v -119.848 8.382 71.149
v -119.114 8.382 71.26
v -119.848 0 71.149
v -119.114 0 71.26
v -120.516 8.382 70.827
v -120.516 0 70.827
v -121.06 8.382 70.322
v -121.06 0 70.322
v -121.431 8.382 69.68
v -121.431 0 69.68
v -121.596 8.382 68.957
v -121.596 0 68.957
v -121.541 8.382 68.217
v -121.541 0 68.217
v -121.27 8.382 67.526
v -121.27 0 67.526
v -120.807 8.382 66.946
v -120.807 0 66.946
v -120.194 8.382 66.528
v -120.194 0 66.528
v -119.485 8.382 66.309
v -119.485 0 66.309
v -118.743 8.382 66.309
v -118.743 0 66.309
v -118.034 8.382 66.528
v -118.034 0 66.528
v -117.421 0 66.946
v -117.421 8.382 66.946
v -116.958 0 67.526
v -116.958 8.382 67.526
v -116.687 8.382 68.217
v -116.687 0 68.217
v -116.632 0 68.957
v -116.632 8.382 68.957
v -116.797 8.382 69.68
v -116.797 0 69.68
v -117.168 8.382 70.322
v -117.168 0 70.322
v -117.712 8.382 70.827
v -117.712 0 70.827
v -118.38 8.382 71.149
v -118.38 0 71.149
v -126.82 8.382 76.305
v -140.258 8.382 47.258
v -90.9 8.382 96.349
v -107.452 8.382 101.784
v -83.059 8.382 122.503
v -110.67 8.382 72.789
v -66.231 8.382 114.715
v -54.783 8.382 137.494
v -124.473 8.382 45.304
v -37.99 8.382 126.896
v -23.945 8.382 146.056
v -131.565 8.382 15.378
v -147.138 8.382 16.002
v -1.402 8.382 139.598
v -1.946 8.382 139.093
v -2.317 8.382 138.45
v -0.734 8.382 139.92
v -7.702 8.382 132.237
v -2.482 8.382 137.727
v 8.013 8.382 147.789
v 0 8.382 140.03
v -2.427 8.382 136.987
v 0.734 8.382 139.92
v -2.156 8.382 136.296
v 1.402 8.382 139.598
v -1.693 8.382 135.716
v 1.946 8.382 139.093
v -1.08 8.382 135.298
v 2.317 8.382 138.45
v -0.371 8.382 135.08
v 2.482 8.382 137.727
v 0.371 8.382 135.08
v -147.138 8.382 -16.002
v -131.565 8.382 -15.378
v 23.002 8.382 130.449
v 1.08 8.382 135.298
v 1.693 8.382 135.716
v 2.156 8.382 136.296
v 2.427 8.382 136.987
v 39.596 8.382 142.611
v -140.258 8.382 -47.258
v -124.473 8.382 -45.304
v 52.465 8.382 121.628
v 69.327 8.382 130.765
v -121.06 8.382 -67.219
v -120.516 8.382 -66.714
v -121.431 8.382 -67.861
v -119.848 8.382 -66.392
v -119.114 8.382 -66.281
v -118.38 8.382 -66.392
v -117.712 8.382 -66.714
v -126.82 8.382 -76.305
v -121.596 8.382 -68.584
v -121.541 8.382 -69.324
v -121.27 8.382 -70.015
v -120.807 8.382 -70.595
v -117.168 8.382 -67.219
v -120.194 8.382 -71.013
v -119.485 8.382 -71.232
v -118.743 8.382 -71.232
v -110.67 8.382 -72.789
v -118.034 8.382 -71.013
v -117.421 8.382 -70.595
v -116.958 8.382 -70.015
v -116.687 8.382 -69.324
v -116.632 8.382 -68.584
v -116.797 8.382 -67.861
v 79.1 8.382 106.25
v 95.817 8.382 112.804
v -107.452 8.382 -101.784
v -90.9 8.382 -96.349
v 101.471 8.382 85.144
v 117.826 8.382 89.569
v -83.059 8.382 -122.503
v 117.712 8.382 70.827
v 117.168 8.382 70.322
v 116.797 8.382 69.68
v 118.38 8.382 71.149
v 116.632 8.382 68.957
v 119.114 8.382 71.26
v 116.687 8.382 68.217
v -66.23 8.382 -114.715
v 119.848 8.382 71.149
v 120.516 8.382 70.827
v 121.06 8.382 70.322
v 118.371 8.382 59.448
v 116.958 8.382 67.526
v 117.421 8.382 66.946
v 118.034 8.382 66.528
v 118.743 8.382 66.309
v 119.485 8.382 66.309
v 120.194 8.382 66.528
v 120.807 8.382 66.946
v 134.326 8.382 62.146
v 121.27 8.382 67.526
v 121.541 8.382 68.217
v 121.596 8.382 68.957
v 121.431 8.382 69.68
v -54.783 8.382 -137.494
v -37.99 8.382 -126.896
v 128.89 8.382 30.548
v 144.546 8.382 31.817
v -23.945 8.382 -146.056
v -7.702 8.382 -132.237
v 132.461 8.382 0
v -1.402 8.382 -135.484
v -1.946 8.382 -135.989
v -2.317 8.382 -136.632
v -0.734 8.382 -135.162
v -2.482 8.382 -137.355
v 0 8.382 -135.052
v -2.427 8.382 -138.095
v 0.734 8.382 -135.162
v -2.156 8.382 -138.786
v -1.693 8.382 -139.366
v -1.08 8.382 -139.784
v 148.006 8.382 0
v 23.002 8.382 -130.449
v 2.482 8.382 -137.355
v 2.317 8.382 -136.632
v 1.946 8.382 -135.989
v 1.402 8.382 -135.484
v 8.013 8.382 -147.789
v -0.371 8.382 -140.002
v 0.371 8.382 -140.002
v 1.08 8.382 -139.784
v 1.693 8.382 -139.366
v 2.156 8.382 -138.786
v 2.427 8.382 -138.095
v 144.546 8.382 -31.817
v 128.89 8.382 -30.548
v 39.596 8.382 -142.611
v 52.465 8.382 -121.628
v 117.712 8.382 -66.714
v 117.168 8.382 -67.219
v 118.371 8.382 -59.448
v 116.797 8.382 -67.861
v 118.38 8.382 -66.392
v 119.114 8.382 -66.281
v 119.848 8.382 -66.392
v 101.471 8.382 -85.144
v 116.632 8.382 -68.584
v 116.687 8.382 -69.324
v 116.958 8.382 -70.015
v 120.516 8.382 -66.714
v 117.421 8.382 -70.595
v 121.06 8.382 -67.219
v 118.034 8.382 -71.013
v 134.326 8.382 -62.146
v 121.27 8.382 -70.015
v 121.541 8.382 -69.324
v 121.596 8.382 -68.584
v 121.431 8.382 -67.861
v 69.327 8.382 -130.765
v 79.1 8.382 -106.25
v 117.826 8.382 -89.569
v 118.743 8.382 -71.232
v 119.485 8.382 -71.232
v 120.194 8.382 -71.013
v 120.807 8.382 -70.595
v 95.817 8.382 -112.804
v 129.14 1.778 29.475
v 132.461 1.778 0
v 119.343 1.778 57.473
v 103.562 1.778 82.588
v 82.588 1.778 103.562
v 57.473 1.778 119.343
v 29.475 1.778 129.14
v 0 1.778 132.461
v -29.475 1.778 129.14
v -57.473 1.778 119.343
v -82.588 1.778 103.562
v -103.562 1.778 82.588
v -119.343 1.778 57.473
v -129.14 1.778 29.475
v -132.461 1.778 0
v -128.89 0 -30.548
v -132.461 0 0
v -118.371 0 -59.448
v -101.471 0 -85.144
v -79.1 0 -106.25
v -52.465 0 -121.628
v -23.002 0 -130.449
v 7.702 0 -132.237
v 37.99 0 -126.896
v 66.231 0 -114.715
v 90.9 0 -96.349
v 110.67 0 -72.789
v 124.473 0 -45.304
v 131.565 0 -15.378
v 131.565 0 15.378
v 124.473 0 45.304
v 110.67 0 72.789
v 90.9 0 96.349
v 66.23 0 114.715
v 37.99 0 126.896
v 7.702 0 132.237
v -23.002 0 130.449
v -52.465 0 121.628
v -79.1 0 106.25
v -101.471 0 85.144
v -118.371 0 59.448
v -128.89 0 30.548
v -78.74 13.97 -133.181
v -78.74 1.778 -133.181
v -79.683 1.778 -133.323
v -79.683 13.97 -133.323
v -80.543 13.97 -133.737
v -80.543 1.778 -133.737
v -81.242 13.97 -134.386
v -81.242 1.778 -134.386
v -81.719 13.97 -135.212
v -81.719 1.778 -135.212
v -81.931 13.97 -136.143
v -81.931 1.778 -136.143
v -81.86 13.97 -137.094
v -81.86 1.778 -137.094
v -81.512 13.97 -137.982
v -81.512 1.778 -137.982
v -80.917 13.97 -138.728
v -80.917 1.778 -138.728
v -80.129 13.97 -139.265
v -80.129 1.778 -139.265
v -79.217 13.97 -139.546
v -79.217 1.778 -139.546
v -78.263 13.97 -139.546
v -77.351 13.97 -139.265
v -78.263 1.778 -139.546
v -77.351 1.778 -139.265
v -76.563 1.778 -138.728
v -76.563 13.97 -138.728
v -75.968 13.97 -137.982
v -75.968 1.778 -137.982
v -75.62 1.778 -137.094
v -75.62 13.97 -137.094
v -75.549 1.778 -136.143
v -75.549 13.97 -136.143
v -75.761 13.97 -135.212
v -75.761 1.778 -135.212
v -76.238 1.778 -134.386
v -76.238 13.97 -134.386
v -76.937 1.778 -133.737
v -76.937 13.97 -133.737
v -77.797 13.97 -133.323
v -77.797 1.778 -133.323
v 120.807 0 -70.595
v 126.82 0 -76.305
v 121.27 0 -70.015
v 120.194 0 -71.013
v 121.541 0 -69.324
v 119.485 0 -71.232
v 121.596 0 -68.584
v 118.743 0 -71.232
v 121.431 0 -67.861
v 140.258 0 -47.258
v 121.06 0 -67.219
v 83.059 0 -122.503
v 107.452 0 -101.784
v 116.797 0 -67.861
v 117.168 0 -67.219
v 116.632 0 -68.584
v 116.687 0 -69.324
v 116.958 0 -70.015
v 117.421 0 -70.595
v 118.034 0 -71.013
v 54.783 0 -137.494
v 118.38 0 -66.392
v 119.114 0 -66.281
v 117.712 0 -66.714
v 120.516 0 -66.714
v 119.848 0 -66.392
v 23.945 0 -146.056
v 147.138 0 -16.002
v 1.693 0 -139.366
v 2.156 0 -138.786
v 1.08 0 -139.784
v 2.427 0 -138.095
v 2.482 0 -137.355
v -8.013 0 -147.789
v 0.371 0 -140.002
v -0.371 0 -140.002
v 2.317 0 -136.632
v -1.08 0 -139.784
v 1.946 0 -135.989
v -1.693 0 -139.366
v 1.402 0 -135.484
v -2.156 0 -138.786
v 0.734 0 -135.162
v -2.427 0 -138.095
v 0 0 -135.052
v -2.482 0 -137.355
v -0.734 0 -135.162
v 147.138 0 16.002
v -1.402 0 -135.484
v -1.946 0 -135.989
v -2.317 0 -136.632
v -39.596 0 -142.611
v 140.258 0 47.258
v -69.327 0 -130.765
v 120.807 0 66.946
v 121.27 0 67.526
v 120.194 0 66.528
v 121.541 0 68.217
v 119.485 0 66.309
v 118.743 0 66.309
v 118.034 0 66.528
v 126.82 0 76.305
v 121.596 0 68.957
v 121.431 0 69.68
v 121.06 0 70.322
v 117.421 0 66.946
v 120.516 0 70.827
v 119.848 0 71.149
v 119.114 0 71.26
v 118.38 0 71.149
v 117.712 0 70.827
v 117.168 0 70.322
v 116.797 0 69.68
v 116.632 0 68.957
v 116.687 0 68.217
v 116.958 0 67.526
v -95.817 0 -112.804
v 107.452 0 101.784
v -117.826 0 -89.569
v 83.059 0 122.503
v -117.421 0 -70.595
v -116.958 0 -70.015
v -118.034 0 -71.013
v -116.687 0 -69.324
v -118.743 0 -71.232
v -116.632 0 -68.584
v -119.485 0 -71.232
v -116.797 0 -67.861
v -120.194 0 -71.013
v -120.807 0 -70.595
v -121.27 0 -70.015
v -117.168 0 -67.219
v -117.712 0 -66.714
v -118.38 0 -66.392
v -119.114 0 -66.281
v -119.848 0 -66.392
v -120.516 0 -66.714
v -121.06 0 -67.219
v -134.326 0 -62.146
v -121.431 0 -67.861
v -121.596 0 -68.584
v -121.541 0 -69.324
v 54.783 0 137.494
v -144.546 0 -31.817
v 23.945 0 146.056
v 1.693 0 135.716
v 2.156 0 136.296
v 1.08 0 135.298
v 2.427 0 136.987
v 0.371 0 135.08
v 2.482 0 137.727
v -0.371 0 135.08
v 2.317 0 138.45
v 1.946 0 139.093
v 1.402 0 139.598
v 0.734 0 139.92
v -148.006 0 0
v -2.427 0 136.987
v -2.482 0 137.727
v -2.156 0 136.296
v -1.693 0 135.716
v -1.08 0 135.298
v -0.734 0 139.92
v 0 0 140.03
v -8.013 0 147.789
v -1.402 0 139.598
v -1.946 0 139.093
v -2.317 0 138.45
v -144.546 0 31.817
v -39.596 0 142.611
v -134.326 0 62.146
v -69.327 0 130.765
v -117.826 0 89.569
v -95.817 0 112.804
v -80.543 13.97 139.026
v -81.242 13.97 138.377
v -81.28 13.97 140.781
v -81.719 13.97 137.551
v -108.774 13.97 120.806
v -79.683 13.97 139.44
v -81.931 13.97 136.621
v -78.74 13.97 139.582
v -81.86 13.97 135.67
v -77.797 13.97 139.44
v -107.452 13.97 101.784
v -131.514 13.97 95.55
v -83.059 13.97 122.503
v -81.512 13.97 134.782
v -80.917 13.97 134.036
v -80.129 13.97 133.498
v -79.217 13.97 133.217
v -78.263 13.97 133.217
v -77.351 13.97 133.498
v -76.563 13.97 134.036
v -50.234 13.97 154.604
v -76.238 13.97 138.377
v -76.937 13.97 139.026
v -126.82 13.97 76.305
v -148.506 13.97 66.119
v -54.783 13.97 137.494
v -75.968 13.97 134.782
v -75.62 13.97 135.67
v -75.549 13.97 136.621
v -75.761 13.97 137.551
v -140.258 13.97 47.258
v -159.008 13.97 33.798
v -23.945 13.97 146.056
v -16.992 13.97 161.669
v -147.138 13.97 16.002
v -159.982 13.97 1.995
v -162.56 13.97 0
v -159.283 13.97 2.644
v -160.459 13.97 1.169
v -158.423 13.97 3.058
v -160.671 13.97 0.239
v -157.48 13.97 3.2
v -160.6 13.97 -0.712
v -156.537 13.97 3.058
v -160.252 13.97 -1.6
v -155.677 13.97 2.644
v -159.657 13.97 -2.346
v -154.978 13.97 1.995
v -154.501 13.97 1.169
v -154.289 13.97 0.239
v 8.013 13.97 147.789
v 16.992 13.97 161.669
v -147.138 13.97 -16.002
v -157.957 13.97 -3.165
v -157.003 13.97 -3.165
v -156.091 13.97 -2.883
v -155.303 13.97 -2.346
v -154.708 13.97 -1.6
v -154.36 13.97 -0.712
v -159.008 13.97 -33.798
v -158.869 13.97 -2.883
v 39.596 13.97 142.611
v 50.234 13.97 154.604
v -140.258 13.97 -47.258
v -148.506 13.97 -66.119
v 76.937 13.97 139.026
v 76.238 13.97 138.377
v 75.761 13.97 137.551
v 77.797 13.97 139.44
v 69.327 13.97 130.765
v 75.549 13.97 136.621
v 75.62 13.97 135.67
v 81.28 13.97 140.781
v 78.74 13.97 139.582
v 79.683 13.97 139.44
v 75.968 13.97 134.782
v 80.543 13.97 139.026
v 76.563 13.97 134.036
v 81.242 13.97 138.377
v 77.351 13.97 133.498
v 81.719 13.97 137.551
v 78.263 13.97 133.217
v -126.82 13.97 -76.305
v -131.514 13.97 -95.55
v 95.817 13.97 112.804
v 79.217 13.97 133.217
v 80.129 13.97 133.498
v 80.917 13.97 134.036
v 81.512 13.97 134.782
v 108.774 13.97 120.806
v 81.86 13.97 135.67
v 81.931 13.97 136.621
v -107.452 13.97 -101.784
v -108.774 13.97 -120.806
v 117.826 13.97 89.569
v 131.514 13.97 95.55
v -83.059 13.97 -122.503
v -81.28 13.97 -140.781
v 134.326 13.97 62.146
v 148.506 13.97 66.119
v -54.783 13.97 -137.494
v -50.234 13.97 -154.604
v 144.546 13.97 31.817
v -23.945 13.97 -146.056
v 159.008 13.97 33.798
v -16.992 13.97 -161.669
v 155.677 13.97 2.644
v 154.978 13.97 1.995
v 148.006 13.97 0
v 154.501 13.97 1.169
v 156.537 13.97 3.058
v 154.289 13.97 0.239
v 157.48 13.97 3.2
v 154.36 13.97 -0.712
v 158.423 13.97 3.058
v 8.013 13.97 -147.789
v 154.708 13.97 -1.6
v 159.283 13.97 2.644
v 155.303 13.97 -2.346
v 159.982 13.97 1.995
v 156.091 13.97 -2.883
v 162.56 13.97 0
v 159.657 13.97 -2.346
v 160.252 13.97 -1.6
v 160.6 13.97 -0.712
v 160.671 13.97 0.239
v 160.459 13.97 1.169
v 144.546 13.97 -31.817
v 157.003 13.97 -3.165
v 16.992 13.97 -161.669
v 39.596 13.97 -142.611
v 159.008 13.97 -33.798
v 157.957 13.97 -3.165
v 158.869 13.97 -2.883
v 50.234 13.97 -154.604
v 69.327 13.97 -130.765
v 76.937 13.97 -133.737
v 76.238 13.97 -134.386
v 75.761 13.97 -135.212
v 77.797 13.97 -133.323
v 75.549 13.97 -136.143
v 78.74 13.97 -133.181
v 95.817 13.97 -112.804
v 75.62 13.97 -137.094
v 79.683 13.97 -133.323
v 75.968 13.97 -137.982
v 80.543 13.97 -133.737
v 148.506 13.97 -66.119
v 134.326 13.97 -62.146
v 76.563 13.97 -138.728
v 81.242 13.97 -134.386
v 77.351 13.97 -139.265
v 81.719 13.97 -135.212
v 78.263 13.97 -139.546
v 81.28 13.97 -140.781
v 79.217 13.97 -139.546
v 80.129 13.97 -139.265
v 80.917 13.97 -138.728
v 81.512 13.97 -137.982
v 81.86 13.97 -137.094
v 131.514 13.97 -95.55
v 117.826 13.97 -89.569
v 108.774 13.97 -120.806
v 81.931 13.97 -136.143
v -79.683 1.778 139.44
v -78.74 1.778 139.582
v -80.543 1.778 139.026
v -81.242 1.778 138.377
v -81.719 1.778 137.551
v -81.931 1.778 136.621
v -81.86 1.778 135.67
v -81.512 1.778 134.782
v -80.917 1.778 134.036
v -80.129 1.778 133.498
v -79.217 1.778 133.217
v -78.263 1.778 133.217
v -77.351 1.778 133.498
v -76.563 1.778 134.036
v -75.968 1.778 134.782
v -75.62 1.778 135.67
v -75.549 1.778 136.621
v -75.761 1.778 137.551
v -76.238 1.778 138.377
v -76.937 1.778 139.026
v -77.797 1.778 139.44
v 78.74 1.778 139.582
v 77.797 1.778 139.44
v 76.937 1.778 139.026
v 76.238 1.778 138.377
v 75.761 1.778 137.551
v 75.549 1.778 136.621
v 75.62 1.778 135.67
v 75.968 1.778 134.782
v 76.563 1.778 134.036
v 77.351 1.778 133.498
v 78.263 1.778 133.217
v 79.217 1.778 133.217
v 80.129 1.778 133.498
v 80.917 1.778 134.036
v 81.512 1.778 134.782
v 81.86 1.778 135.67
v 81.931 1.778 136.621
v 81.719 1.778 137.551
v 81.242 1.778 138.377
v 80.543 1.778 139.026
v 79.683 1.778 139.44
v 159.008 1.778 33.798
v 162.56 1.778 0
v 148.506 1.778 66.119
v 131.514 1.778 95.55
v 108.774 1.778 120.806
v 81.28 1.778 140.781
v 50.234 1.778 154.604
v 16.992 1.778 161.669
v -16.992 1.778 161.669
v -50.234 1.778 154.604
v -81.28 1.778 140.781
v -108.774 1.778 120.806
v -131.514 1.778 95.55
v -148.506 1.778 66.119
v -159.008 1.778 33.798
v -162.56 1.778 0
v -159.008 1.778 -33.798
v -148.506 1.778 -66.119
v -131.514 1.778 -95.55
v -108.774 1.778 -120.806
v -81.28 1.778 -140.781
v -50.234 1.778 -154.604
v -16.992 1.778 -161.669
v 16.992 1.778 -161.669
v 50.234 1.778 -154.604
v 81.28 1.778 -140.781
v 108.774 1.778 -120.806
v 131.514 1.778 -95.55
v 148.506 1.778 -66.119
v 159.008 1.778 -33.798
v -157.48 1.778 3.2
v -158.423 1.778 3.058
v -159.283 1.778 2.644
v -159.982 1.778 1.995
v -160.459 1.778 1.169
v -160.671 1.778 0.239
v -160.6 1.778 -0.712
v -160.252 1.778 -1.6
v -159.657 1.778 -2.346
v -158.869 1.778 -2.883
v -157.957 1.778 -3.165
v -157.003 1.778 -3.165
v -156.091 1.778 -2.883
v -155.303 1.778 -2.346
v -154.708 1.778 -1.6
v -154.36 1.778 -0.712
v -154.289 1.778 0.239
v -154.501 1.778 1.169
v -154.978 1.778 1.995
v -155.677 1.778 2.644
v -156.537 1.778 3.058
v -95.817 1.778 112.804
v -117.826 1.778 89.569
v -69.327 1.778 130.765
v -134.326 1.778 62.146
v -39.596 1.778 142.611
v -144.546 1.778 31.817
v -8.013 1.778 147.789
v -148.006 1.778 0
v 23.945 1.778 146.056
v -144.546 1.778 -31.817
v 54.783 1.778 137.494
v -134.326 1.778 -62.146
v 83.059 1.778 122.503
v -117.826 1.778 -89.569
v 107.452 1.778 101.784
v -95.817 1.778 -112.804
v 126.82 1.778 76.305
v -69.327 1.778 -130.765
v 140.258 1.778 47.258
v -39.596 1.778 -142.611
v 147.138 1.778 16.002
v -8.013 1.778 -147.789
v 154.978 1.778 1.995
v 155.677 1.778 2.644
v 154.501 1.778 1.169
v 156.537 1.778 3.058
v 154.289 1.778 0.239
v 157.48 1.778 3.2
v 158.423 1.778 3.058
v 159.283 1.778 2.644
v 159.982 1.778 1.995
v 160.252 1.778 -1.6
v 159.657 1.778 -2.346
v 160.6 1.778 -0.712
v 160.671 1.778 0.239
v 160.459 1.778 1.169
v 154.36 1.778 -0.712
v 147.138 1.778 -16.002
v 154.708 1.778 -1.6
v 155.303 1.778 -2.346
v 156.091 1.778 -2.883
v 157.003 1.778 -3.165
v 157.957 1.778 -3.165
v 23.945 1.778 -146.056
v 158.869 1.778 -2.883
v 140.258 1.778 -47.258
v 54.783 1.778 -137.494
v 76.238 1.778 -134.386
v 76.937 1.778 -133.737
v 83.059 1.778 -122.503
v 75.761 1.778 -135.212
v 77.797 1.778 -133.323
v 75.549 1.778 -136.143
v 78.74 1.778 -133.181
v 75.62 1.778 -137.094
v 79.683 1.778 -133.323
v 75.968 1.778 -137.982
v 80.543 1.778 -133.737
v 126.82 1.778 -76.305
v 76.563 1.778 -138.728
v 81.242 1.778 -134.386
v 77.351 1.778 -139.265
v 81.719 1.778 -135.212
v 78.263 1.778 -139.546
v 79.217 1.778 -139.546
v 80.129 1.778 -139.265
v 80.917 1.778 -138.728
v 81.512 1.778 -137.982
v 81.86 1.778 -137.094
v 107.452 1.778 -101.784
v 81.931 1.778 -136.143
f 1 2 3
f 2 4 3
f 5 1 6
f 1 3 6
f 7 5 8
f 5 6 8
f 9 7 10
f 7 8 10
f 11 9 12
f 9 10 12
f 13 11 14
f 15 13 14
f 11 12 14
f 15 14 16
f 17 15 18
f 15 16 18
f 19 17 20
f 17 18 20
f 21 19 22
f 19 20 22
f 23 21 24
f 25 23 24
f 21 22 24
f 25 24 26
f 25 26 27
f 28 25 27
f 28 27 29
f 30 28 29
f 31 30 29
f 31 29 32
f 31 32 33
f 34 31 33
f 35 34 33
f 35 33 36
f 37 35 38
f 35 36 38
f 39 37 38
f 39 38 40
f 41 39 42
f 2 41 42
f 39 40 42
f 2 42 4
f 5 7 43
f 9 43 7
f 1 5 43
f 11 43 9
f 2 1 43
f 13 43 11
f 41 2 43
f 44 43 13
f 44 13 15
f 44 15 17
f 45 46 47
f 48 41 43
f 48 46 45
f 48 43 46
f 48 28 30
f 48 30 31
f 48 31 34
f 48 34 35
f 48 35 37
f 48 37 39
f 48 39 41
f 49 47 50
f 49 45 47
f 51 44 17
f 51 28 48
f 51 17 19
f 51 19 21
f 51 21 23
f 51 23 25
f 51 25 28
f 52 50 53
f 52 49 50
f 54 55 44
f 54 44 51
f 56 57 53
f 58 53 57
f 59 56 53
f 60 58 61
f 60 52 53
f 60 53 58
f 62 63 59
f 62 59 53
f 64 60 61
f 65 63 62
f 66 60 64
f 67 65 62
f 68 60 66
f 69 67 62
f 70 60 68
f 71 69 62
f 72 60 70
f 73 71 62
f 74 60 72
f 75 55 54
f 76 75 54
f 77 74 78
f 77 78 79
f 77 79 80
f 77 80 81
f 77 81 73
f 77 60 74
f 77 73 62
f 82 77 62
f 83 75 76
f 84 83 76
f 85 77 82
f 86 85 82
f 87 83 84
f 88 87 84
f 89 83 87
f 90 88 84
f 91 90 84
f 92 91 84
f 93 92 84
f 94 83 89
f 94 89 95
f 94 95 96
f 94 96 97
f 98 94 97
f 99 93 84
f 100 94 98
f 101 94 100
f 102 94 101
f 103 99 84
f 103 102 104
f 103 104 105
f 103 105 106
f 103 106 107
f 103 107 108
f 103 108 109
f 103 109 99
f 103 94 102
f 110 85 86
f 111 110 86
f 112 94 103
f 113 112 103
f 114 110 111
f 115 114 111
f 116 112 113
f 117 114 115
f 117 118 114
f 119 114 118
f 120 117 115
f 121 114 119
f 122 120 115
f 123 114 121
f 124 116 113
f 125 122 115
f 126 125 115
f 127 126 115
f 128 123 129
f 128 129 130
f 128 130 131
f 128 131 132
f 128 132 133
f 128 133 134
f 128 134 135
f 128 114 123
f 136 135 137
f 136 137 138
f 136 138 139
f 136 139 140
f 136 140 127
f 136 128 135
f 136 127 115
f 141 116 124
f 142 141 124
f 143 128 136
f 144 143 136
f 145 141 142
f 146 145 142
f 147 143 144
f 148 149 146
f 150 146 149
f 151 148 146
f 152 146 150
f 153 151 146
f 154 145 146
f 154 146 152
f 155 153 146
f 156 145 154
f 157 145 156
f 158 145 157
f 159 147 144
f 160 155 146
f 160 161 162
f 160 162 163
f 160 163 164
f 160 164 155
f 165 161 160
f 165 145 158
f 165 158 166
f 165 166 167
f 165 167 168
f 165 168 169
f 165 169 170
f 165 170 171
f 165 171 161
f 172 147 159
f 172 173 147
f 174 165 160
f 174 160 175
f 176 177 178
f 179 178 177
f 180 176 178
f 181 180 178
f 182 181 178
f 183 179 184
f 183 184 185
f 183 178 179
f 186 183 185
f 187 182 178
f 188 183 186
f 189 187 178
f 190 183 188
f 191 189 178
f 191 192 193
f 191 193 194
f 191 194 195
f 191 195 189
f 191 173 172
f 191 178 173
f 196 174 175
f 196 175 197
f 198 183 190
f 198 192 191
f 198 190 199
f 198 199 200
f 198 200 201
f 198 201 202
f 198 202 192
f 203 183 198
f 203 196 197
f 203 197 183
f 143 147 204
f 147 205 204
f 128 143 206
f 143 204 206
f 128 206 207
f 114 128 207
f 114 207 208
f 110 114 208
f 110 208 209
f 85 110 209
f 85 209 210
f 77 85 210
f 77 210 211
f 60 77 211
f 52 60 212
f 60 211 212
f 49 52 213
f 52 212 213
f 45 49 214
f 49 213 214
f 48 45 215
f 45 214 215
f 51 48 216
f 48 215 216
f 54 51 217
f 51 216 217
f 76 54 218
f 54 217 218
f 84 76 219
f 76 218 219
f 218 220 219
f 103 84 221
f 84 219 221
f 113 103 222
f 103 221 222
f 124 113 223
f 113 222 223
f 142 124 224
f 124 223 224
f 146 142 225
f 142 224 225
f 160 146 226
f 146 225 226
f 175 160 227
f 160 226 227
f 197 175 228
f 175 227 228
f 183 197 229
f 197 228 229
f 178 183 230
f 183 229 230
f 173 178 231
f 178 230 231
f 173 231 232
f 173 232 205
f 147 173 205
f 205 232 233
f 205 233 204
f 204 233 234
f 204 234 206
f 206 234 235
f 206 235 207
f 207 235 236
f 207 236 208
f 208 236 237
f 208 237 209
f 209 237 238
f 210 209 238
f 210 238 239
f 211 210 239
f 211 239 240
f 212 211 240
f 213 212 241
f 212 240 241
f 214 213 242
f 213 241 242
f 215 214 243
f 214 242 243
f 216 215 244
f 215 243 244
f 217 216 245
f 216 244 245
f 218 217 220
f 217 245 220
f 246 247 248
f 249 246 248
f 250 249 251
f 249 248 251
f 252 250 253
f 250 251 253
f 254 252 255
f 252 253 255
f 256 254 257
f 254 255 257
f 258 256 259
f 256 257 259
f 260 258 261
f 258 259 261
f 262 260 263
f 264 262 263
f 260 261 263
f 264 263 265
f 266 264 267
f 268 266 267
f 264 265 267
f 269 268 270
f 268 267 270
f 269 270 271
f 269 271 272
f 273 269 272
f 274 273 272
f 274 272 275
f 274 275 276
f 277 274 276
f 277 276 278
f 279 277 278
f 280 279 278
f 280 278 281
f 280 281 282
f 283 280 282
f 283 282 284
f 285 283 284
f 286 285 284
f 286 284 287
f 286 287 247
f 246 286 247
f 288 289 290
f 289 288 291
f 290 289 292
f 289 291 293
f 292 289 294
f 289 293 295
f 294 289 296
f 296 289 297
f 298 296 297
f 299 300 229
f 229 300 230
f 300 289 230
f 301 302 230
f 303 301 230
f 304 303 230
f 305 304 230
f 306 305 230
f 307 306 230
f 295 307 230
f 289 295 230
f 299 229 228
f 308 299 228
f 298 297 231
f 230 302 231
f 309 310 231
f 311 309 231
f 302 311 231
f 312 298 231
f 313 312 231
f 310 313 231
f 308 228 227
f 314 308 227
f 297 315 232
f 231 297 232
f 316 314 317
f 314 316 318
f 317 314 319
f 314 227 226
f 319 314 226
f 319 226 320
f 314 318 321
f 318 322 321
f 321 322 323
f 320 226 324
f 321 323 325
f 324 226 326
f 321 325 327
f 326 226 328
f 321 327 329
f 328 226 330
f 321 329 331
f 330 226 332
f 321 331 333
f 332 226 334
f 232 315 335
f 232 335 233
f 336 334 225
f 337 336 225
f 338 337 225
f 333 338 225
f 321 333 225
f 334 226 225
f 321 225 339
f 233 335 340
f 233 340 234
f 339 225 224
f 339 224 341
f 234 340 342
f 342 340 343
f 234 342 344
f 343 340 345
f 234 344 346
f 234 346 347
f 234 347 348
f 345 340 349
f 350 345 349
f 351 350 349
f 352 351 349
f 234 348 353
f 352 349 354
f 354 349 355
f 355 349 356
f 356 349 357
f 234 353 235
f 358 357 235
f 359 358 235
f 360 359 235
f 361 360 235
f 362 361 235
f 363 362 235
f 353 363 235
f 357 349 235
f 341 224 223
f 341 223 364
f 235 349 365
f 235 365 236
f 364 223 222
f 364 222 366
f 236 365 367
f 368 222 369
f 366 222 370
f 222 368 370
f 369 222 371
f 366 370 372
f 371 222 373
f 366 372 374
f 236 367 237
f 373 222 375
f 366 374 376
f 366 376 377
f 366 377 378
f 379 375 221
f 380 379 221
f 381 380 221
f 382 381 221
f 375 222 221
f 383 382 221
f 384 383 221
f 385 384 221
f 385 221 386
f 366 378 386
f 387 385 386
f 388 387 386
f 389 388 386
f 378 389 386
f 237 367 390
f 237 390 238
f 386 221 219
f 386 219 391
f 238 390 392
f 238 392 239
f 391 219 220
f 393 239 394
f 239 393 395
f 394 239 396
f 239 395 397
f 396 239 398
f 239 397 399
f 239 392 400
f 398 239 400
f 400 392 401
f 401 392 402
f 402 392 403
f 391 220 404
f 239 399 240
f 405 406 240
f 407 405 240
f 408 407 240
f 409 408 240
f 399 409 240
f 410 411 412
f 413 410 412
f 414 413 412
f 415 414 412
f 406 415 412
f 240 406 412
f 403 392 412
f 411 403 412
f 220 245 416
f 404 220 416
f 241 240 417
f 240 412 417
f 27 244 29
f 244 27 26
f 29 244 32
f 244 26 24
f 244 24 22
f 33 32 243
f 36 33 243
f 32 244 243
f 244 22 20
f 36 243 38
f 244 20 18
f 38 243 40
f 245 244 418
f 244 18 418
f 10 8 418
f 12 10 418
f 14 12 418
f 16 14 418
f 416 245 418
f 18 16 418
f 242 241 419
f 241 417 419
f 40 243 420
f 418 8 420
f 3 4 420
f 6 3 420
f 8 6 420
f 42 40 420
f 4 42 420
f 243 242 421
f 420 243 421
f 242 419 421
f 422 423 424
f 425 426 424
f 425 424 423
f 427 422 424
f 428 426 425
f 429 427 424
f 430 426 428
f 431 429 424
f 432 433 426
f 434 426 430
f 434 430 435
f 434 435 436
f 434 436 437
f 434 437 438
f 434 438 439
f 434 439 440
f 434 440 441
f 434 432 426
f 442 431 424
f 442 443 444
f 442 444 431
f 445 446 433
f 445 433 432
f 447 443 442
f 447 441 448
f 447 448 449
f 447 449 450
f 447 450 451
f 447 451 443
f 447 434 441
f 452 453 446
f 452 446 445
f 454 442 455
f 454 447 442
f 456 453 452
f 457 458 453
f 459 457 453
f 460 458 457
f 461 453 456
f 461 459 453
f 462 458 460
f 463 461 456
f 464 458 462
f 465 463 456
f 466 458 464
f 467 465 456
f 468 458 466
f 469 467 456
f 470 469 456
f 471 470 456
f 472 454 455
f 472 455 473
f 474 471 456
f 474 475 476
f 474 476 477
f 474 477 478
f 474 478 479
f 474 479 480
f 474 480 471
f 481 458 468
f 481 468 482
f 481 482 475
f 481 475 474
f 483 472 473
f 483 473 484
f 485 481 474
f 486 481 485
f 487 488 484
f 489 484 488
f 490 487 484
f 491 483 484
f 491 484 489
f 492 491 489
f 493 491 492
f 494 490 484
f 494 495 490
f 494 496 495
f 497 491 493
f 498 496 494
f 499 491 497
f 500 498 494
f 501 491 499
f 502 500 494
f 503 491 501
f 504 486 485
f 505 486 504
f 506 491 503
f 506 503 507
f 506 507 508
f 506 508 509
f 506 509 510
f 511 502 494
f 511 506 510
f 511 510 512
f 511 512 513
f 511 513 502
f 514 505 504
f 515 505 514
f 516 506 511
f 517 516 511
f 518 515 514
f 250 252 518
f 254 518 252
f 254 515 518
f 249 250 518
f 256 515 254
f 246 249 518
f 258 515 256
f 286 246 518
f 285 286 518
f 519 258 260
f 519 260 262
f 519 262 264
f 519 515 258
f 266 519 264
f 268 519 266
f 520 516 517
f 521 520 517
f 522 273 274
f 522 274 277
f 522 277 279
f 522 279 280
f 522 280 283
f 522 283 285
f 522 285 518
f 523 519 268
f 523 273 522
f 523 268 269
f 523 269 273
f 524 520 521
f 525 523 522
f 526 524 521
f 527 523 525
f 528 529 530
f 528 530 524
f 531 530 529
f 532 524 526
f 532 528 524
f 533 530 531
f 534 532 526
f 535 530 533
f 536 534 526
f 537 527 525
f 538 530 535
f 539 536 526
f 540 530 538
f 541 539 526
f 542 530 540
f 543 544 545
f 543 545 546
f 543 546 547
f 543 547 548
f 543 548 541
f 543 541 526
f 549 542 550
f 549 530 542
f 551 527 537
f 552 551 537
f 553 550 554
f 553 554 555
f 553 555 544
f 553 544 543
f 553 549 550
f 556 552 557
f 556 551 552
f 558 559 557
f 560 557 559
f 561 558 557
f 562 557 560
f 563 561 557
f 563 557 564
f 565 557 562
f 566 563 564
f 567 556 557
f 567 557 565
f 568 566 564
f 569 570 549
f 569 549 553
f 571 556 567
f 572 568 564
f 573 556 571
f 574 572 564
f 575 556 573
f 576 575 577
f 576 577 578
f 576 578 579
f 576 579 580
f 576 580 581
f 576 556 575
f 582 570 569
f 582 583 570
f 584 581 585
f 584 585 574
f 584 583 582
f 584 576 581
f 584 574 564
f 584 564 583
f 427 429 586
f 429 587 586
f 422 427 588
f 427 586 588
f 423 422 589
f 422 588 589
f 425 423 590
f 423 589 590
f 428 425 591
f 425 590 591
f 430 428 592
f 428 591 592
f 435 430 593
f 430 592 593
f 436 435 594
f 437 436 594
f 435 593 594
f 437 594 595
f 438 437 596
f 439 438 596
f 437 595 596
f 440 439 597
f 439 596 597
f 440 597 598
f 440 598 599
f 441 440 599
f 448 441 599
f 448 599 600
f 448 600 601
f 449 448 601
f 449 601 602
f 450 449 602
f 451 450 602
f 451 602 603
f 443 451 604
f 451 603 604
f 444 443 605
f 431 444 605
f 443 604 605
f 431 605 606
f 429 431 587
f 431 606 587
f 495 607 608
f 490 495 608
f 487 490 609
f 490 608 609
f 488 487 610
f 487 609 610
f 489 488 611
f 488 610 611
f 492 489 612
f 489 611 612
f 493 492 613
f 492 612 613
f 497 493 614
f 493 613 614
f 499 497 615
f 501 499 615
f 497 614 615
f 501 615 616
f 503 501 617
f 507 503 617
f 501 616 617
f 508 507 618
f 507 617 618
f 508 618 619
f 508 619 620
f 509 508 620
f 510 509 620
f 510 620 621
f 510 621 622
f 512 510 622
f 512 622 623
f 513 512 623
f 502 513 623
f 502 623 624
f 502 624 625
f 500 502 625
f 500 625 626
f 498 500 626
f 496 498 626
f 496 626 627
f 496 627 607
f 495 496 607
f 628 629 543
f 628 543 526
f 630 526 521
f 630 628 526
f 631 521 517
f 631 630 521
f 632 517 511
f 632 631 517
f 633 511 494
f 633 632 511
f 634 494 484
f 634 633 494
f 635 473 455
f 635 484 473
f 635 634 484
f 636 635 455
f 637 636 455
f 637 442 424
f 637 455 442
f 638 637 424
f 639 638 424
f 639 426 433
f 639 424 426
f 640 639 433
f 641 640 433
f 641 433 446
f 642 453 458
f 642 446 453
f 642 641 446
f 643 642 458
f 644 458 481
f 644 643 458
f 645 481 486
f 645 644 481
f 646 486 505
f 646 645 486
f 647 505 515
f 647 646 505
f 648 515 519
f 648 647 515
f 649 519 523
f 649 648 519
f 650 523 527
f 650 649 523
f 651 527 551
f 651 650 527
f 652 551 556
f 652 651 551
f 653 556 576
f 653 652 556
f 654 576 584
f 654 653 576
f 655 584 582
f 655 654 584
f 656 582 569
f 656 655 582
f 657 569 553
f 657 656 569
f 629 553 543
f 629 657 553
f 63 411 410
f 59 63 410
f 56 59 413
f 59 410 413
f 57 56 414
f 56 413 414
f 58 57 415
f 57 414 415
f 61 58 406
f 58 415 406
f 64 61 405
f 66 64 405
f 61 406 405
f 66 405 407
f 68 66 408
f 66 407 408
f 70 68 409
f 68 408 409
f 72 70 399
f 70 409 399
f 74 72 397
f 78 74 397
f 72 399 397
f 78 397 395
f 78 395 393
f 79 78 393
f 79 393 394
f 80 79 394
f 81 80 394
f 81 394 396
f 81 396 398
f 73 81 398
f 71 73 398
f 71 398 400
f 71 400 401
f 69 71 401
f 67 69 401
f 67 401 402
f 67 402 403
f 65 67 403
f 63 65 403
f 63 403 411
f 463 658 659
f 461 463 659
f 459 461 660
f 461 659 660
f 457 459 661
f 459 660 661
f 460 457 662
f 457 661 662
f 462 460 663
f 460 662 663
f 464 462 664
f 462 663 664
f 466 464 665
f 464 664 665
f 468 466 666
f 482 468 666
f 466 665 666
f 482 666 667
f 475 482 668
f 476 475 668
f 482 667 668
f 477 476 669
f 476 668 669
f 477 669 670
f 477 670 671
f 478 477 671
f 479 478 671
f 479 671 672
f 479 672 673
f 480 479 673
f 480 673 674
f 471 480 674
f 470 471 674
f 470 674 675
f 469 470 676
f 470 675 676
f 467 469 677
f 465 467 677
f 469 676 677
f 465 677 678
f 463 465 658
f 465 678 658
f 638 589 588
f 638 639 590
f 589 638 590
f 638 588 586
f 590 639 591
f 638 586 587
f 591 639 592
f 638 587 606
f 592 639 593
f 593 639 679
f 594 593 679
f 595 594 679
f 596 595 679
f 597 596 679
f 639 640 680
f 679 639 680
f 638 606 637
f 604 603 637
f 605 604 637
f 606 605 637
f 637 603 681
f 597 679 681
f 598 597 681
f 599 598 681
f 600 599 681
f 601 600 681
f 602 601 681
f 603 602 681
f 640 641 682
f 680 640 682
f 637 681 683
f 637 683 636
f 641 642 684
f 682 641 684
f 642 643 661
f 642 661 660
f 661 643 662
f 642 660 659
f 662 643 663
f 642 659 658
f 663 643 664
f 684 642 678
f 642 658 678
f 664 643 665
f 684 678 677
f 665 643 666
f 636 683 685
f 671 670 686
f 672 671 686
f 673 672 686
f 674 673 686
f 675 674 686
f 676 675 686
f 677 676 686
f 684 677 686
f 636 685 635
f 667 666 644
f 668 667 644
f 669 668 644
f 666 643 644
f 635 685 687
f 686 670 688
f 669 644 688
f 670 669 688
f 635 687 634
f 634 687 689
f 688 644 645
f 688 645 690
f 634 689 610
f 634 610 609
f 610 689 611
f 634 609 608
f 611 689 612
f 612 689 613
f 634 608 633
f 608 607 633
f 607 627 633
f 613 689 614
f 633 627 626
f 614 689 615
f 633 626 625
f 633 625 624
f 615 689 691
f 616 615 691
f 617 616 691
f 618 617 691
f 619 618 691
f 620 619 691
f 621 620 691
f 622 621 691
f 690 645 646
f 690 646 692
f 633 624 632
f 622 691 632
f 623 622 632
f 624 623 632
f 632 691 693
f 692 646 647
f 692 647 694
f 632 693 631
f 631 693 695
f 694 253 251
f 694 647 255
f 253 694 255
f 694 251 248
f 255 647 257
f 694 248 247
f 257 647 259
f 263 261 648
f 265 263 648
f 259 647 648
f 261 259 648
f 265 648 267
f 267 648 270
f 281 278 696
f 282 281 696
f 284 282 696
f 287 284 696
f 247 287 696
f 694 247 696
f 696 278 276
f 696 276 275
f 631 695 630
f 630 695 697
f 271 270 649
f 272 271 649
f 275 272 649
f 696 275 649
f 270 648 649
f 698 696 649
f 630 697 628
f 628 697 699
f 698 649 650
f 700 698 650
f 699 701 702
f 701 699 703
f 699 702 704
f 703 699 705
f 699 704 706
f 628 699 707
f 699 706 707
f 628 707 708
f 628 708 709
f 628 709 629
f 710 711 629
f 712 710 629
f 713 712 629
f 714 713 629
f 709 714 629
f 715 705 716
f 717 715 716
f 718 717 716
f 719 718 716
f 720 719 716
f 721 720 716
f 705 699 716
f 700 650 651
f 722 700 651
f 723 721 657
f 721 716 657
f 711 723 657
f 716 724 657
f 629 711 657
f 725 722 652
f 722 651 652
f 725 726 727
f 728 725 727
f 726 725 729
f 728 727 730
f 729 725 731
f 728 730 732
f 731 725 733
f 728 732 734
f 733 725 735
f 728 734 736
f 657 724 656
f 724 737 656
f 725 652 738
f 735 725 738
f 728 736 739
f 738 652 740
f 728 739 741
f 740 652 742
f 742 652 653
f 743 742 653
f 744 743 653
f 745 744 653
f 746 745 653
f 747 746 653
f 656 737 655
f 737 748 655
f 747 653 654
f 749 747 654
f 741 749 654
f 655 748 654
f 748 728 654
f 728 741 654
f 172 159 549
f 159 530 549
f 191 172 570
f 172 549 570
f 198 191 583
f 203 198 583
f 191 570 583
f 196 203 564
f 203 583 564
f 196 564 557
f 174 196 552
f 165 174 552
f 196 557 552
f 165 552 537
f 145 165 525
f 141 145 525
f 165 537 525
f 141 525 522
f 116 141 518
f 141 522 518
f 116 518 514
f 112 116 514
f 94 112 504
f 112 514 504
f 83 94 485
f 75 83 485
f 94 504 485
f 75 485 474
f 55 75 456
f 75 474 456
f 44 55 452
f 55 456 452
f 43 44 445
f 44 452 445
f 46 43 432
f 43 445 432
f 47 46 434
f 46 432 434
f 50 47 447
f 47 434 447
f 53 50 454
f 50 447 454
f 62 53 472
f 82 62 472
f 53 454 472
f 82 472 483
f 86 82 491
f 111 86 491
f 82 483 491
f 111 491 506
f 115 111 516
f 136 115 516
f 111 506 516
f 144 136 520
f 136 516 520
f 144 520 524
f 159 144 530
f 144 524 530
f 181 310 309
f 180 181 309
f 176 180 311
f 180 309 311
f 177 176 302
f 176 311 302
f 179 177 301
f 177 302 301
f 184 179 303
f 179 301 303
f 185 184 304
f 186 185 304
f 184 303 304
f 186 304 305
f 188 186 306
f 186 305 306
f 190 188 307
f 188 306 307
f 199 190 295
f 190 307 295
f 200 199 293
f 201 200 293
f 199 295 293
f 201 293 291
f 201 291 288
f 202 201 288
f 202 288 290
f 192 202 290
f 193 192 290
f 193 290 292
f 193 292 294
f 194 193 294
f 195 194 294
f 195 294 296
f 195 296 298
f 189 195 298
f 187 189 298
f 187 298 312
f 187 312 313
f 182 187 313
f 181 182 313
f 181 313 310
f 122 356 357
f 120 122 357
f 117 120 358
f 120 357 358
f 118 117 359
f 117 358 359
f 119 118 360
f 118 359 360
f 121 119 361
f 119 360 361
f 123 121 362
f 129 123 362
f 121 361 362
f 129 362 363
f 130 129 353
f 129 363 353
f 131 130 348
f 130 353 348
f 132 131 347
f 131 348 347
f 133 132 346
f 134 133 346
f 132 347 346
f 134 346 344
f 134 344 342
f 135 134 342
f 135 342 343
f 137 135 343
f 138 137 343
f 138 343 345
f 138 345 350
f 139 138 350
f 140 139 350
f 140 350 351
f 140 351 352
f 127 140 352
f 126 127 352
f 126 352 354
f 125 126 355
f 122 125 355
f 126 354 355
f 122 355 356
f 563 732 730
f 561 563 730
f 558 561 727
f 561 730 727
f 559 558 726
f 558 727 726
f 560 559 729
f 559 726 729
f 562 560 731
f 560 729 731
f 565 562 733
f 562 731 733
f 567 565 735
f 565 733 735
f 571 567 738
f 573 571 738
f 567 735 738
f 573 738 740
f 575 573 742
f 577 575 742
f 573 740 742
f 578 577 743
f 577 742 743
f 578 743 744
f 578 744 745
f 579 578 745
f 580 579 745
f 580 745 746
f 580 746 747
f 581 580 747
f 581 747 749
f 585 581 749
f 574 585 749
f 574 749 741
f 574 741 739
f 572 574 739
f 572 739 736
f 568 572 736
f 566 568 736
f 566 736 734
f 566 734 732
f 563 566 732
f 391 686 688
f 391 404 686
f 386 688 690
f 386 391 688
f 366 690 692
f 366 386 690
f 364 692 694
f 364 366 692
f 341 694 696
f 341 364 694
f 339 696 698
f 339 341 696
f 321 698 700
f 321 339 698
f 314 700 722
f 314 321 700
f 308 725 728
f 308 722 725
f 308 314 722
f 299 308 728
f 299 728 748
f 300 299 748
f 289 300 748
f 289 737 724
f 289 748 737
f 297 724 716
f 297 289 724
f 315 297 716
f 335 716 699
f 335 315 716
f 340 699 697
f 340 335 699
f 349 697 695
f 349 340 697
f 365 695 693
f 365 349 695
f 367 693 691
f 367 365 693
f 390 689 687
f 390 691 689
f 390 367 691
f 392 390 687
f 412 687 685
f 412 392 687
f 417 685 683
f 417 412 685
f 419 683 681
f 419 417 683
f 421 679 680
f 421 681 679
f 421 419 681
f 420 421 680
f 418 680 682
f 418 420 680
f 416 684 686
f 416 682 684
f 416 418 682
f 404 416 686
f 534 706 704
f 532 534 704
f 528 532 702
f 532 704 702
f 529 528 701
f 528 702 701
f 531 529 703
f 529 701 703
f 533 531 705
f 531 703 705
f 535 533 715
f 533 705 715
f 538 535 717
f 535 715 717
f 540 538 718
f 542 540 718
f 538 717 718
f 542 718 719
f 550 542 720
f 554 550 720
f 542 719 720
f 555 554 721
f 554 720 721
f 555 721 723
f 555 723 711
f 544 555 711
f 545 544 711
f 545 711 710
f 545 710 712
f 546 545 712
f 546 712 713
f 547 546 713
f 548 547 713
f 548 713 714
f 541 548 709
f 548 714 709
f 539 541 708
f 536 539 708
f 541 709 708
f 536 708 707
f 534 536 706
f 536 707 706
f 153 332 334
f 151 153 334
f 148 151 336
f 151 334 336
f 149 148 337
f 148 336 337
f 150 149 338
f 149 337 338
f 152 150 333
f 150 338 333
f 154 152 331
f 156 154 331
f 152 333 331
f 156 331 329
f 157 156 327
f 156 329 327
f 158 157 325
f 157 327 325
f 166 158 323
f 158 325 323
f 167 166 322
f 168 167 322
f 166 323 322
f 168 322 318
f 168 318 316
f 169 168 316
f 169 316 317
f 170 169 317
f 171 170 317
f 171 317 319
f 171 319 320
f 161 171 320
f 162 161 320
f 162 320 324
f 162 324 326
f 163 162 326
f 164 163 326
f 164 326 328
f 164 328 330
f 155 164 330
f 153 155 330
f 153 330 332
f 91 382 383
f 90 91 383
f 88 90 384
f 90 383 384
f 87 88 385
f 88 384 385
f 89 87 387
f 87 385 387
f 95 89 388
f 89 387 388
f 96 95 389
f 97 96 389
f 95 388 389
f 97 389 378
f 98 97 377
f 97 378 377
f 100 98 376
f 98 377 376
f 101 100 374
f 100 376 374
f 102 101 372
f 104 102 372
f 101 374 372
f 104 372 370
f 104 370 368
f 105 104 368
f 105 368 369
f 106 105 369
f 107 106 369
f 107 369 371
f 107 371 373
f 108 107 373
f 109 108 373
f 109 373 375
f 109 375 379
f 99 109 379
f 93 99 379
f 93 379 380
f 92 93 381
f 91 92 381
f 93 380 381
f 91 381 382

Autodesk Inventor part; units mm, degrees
ref_plane "YZ Plane" through (0, 0, 0) normal (1, 0, 0) x (0, 1, 0)
ref_plane "XZ Plane" through (0, 0, 0) normal (0, 1, 0) x (-1, 0, 0)
ref_plane "XY Plane" through (0, 0, 0) normal (0, 0, 1) x (1, 0, 0)
sketch "Sketch1" plane through (0, 0, 0) normal (0, 1, 0) x (-1, 0, 0)
  circle A0 centre (0, 0) radius 162.56 construction
  circle A1 centre (0, 0) radius 148.0058
  circle A2 centre (0, 0) radius 132.461
  dimension "d0" = 325.12
  dimension "d1" = 296.0116
  dimension "d2" = 264.922
extrude "Extrusion1" add sketch "Sketch1" along normal blind 1.778
sketch "Sketch2" plane through (0, 1.778, 0) normal (0, 1, 0) x (1, 0, 0)
  circle A0 centre (0, 0) radius 132.461
  circle A1 centre (0, 0) radius 162.56
  dimension "d5" = 325.12
extrude "Extrusion2" add sketch "Sketch2" along normal blind 12.192
sketch "Sketch3" plane through (0, 13.97, 0) normal (0, 1, 0) x (1, 0, 0)
  circle A0 centre (0, 0) radius 148.0058
  circle A1 centre (0, 0) radius 132.461
extrude "Extrusion3" cut sketch "Sketch3" against normal blind 5.588
sketch "Sketch4" plane through (0, 13.97, 0) normal (0, 1, 0) x (1, 0, 0)
  circle A0 centre (0, 0) radius 157.48 construction
  circle A1 centre (-157.48, 0) radius 3.9687
  circle A2 centre (-78.74, -136.3817) radius 3.9687
  circle A3 centre (78.74, -136.3817) radius 3.9687
  circle A4 centre (157.48, 0) radius 3.9687
  circle A5 centre (78.74, 136.3817) radius 3.9687
  circle A6 centre (-78.74, 136.3817) radius 3.9687
  dimension "d10" = 314.96
  dimension "d11" = 7.9375
  dimension "d14" = 360
hole "Hole1" at (-157.48, 13.97, 0) at (78.74, 13.97, -136.3817) at (-78.74, 13.97, -136.3817) at (157.48, 13.97, 0) at (78.74, 13.97, 136.3817) at (-78.74, 13.97, 136.3817) direction (0, -1, 0) diameter 6.4008 depth 22.9362 thread size "5/16-18 UNC" class "2B" standard "ANSI Unified Screw Threads"
sketch "Sketch5" plane through (0, 8.382, 0) normal (0, 1, 0) x (1, 0, 0)
  line L0 (0, 0) -> (-122.3635, 70.6466) construction
  line L1 (0, 0) -> (141.2932, 0) construction
  line L2 (-122.3635, 70.6466) -> (0, 0) construction
  line L3 (0, 0) -> (-128.1768, -74.0029) construction
  circle A0 centre (0, 0) radius 148.0058 construction
  line L4 (0, 0) -> (148.0058, 0) construction
  circle A1 centre (0, 0) radius 137.541 construction
  circle A2 centre (-119.114, -68.7705) radius 3.175
  circle A3 centre (0, -137.541) radius 3.175
  circle A4 centre (119.114, -68.7705) radius 3.175
  circle A5 centre (119.114, 68.7705) radius 3.175
  circle A6 centre (0, 137.541) radius 3.175
  circle A7 centre (-119.114, 68.7705) radius 3.175
  dimension "d25" = 275.082
  dimension "d23" = 150
  dimension "d24" = 150
  dimension "d26" = 6.35
  dimension "d29" = 360
hole "Hole2" at (0, 8.382, 137.541) at (119.114, 8.382, 68.7705) at (119.114, 8.382, -68.7705) at (0, 8.382, -137.541) at (-119.114, 8.382, -68.7705) at (-119.114, 8.382, 68.7705) direction (0, -1, 0) diameter 4.9784 depth 19.05 thread size "1/4-20 UNC" class "2B" standard "ANSI Unified Screw Threads"
properties part number "Turntable_2"
